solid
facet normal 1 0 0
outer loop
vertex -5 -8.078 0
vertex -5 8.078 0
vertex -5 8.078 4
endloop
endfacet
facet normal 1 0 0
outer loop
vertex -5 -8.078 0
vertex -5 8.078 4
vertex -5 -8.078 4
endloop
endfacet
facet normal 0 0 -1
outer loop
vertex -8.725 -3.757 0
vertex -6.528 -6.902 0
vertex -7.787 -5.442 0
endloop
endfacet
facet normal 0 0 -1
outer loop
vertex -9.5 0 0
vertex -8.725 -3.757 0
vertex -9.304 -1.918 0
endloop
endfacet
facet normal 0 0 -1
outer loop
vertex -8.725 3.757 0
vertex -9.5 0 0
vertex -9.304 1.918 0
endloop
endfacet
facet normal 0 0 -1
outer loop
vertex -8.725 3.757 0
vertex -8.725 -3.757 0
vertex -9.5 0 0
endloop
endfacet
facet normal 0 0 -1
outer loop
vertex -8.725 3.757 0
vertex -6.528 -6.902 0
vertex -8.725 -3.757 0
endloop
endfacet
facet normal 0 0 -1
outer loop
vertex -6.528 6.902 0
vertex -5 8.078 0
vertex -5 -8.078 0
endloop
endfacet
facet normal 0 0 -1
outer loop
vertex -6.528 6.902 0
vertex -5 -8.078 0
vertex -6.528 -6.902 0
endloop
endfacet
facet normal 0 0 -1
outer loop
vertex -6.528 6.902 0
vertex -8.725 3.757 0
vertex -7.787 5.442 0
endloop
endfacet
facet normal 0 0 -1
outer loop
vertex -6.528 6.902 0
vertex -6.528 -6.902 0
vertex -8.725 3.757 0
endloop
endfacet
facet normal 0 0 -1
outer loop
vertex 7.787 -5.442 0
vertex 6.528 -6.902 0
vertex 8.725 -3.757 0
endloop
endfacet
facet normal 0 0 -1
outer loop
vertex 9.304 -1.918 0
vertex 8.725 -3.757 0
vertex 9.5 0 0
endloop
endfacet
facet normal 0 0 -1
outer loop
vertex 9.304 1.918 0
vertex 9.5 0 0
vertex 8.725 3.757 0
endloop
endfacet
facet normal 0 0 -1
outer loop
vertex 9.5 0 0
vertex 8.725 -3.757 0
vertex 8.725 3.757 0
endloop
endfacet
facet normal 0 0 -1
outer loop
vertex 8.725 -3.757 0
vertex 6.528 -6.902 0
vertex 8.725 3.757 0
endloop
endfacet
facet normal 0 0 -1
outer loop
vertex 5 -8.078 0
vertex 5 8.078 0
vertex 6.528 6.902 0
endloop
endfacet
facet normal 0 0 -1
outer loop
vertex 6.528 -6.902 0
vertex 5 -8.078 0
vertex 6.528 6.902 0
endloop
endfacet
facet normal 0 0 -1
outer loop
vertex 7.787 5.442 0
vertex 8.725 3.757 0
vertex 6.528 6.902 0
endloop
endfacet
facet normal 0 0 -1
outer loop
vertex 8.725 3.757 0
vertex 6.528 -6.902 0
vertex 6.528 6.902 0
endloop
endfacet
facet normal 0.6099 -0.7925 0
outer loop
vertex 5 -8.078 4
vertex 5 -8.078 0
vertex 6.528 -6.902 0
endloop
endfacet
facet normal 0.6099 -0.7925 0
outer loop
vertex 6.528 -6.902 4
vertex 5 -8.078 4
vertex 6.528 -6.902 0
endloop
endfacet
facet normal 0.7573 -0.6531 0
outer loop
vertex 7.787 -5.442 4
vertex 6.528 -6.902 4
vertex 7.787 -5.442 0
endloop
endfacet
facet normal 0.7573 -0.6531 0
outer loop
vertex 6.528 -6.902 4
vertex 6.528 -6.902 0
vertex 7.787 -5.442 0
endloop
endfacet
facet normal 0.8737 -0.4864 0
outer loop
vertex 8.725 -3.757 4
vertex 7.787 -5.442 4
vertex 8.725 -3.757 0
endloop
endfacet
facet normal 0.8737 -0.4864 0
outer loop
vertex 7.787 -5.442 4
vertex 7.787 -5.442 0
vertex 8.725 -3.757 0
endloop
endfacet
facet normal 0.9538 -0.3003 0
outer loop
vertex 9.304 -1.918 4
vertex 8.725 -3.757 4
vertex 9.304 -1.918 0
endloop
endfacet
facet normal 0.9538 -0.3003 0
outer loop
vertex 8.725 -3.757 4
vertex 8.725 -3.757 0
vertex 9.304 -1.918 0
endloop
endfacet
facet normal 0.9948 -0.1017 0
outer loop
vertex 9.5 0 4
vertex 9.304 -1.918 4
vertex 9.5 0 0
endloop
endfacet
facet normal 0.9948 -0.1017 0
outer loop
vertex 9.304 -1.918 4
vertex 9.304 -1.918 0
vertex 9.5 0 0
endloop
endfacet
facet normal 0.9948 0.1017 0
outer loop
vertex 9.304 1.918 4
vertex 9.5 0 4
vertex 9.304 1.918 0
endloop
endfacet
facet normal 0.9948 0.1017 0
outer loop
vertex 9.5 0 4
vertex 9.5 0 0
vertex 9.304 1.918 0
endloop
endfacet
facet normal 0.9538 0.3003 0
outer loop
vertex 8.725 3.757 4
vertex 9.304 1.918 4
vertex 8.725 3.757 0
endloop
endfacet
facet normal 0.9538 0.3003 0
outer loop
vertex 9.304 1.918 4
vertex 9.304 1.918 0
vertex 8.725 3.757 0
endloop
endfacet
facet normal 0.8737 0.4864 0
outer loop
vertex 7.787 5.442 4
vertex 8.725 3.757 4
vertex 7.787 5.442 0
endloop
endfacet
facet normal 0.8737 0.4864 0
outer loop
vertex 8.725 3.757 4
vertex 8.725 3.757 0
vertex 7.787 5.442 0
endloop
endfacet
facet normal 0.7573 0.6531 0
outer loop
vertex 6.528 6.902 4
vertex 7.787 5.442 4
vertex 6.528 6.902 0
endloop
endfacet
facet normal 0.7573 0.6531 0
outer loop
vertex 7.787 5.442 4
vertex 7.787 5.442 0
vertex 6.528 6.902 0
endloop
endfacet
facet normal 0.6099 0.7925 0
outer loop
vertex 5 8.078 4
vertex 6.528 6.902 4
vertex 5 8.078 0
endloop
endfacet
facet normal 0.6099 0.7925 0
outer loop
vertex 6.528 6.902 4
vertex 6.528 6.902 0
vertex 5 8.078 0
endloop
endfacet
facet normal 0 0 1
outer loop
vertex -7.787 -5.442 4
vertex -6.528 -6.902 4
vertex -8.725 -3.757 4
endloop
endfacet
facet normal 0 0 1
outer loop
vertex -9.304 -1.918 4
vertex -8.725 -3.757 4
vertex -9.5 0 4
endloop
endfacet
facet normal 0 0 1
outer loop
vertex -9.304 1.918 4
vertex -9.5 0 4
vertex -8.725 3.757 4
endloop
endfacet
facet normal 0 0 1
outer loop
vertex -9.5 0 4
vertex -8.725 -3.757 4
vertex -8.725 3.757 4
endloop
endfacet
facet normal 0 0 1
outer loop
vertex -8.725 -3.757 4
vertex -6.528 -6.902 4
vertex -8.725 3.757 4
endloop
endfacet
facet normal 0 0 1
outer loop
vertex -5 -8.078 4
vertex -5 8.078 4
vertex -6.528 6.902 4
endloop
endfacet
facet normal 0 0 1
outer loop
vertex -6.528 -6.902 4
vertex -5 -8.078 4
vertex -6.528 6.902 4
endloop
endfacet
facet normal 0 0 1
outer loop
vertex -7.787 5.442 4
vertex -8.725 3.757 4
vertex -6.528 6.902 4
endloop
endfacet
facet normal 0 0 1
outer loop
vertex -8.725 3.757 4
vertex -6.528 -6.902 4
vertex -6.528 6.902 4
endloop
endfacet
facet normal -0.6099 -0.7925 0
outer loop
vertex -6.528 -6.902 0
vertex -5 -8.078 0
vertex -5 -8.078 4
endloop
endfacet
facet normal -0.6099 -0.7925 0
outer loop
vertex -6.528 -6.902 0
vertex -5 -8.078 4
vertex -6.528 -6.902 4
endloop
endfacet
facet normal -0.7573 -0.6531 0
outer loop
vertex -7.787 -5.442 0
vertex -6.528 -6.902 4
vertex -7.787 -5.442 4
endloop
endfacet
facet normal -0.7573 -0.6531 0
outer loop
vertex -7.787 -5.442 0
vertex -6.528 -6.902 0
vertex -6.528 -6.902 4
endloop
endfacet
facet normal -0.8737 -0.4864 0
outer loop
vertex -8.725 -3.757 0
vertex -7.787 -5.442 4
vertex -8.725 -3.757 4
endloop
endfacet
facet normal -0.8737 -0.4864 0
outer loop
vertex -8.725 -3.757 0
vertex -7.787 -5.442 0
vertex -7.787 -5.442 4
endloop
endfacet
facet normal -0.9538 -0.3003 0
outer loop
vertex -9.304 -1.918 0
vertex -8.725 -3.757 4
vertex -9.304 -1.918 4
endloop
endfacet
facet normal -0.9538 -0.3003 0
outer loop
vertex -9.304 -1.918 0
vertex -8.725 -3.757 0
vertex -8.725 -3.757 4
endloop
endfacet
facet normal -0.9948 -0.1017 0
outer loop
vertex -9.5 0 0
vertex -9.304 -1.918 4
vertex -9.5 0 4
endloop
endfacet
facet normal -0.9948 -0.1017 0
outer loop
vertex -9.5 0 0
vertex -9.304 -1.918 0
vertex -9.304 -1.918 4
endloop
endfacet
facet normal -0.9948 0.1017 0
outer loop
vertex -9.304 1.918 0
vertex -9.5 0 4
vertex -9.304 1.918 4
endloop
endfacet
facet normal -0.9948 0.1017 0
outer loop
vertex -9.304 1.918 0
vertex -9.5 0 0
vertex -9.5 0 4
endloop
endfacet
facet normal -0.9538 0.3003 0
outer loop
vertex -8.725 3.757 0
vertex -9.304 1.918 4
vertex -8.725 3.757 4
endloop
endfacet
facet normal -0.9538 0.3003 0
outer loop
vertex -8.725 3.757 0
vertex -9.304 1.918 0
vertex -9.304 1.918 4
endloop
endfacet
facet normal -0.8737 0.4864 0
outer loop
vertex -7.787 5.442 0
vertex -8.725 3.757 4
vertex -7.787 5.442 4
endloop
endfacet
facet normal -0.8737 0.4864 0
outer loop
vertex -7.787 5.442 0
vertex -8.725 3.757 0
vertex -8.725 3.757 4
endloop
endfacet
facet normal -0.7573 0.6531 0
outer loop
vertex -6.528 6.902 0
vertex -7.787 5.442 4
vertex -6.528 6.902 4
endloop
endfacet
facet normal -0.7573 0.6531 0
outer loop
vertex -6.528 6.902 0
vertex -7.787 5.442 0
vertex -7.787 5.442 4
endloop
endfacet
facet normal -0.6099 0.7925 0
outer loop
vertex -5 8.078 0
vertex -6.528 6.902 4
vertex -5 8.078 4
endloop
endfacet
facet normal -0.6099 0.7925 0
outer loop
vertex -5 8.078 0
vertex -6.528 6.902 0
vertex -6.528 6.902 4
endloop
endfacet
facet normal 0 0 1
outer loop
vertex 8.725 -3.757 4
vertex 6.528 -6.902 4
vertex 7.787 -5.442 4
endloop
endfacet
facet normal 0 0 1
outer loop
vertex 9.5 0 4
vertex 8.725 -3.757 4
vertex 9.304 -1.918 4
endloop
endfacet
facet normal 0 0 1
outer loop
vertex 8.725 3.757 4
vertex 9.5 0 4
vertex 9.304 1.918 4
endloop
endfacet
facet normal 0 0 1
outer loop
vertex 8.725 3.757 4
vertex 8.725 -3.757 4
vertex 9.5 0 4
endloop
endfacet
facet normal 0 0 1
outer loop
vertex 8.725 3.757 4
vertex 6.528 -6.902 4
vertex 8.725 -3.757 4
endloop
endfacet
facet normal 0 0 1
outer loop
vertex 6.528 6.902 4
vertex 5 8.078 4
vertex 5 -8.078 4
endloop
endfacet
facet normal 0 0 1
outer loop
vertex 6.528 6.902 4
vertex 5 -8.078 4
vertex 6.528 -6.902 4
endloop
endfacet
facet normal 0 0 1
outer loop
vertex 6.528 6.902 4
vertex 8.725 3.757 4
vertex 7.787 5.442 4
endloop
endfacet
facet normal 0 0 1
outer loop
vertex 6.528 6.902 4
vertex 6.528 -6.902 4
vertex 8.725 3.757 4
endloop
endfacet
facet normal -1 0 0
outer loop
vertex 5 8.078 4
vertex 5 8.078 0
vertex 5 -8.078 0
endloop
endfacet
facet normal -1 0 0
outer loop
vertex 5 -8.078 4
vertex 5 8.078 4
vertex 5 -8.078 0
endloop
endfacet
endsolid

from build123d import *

# Parameters (mm, degrees)
BOSS_EXTRUDE1_DEPTH   = 4
BOSS_EXTRUDE1_2_DEPTH = 4


with BuildPart() as part:
    # Sketch1 → Boss-Extrude1 (new body)
    with BuildSketch(Plane.XY):
        with BuildLine():
            Line((-5, 8.077747211), (-5, -8.077747211))
            ThreePointArc((-5, -8.077747211), (-9.5, 0), (-5, 8.077747211))
        make_face()
    extrude(amount=BOSS_EXTRUDE1_DEPTH)


with BuildPart() as body_2:
    # Sketch1 → Boss-Extrude1 2 (new body)
    with BuildSketch(Plane.XY):
        with BuildLine():
            Line((5, 8.077747211), (5, -8.077747211))
            ThreePointArc((5, -8.077747211), (9.5, 0), (5, 8.077747211))
        make_face()
    extrude(amount=BOSS_EXTRUDE1_2_DEPTH)


solid = Compound([part.part, body_2.part])
